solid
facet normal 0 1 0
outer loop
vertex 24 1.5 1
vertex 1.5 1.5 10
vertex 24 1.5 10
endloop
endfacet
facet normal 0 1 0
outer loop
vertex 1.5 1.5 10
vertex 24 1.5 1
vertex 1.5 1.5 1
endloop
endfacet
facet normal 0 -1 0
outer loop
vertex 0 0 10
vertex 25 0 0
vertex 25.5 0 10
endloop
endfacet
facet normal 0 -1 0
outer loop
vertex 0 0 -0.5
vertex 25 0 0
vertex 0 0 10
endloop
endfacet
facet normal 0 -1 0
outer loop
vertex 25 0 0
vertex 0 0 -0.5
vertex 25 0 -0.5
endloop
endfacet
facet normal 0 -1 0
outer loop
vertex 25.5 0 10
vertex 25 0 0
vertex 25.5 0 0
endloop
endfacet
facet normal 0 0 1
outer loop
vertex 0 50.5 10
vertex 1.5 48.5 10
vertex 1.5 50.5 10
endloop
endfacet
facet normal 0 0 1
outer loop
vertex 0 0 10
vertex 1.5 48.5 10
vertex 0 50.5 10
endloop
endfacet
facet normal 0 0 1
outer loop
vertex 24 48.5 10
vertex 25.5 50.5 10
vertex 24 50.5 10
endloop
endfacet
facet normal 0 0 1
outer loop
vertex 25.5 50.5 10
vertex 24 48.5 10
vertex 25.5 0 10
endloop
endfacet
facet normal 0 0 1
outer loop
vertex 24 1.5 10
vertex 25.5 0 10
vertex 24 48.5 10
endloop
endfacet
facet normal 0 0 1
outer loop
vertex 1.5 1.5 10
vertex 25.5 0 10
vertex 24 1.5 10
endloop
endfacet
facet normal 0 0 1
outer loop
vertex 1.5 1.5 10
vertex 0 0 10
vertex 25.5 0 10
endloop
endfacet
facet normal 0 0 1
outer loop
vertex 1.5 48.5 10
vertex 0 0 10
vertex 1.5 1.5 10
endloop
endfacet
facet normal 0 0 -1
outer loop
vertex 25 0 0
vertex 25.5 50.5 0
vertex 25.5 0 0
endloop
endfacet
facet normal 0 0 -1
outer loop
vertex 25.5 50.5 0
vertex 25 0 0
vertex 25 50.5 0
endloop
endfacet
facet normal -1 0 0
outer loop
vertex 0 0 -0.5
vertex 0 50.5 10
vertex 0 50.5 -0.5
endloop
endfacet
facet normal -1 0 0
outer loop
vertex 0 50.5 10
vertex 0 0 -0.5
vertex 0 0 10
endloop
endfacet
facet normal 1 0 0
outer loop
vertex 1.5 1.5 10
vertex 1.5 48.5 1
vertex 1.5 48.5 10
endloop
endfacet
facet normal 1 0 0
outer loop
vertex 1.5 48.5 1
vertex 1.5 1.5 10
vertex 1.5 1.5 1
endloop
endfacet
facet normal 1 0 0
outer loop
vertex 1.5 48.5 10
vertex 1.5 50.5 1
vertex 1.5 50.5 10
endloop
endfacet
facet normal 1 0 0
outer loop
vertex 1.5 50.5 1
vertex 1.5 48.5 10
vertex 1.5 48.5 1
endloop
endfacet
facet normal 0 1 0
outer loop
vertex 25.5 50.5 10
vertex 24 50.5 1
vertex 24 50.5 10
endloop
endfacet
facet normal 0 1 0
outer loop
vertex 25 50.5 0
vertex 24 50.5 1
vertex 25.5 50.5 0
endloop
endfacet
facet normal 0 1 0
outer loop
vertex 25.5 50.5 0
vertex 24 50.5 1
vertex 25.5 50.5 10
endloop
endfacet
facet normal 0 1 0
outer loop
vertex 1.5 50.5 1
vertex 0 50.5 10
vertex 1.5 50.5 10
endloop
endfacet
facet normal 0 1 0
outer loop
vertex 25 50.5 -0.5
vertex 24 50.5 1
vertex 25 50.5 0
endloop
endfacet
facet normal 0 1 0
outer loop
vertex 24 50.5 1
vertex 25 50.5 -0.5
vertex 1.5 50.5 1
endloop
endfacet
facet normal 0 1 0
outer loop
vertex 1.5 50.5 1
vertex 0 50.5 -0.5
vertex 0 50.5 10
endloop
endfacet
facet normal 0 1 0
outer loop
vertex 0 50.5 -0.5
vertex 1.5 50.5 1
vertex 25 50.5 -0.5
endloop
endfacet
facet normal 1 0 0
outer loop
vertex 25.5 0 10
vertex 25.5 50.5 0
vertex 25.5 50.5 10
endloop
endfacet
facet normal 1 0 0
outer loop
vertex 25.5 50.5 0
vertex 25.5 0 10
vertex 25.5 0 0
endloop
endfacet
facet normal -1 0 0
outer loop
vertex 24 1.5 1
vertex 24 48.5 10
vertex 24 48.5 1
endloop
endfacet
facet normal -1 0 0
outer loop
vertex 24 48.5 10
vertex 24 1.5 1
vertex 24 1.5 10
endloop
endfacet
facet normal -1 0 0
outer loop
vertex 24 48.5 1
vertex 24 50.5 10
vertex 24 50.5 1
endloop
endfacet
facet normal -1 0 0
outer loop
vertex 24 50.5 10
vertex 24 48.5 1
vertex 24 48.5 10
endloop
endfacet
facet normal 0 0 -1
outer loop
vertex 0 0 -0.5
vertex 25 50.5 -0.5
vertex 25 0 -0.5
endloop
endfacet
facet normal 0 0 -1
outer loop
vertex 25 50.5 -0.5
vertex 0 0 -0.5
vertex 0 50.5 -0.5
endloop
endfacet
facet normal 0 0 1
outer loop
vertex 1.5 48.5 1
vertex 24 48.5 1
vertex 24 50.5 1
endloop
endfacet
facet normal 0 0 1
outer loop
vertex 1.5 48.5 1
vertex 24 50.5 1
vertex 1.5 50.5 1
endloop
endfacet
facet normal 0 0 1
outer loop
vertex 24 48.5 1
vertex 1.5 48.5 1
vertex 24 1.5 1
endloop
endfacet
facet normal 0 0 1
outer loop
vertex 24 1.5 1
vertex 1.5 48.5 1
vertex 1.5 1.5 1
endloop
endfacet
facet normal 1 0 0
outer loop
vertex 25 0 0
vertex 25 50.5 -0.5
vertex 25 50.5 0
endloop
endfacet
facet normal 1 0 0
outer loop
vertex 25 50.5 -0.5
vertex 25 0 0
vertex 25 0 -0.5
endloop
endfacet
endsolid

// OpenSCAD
// file: ../base/cube_stacker_base.scad
//Includes 
use <../base/cube_base.scad>

//Model information
model_length = 10;
model_depth = 10;
model_height = 10;
model_offset = 0;
box_height = 1;
model_opening = 0;
model_slack = 10;
stacker_height = 100;
stacker_wall_thickness = 10;

/*
translate([model_offset, model_offset, 0]){
	box(model_length, model_depth, model_height, 1);
}
*/

module stacker(model_length, model_depth, model_height, model_opening, stacker_height, stacker_wall_thickness, box_height, model_slack){
	//Calculated
	wall_length_calc = model_length * model_slack;
	model_depth_calc = model_depth * model_slack;
	model_height_calc = model_height * model_slack;

	//Wall 
	wall_length = [wall_length_calc, stacker_wall_thickness, wall_length_calc, stacker_wall_thickness];
	wall_depth = [stacker_wall_thickness, model_depth_calc, stacker_wall_thickness, model_depth_calc];
	wall_height = [stacker_height, stacker_height, stacker_height -model_opening, stacker_height];
	wall_box_height = [box_height, box_height, box_height, box_height];
	wall_offset = [
	[0, 0, 0],
	[0, 0, 0],
	[0, model_depth_calc - stacker_wall_thickness, model_opening],
	[wall_length_calc, 0, 0]
	];

	wall = [
	wall_length,
	wall_depth,
	wall_height,
	wall_box_height,
	wall_offset
	];

	for(segment = [0:3]){
		translate(wall[4][segment]){
			box(wall[0][segment], wall[1][segment], wall[2][segment], wall[3][segment]);
		}
	}
}
stacker(model_length, model_depth, model_height, model_opening, stacker_height, stacker_wall_thickness, box_height, model_slack);
// file: ../base/cube_base.scad
input_length = 10;
input_height = 10;
input_depth = 10;
box_size = 1;

module box(input_length, input_depth, input_height, box_size){
	length = input_length;
	height = input_height - box_size;
	depth = input_depth;

	bottom_back_left =   [0,      0,     0];
	top_back_left =      [0,      0,     height];
	bottom_front_left =  [0,      depth, 0];
	top_front_left =     [0,      depth, height];
	bottom_back_right =  [length, 0,     0];
	top_back_right =     [length, 0,     height];
	bottom_front_right = [length, depth, 0];
	top_front_right =    [length, depth, height];

	box = [bottom_back_left, top_back_left, bottom_front_left, top_front_left, bottom_back_right, top_back_right, bottom_front_right, top_front_right];

	hull(){
		for(position = box){
			translate(position){
				cube(box_size);
			}
		}
	}
}

box(input_length, input_depth, input_height, box_size);
// main file
//Includes 
use <../base/cube_base.scad>
use <../base/cube_stacker_base.scad>

//Bottom
bottom_length = 24;
bottom_depth = 49.5;
bottom_height = .5;

//Walls
wall_length = bottom_length;
wall_depth = bottom_depth;
wall_height = 10;
//wall_height = 5;
wall_opening = 1;
wall_thickness = .5;
wall_box_height = 1;
wall_slack = 1;

//opening
opening_length = bottom_length -2.5;
opening_depth = 3;
opening_height = wall_height + 1;
opening_translate = [1.5, bottom_depth -1, 0];

box(bottom_length, bottom_depth, bottom_height, 1);
difference(){
	stacker(wall_length, wall_depth, wall_height, wall_opening, wall_height, wall_thickness, wall_box_height, wall_slack);
	translate(opening_translate){
		box(opening_length, opening_depth, opening_height, 1);
	}
}
